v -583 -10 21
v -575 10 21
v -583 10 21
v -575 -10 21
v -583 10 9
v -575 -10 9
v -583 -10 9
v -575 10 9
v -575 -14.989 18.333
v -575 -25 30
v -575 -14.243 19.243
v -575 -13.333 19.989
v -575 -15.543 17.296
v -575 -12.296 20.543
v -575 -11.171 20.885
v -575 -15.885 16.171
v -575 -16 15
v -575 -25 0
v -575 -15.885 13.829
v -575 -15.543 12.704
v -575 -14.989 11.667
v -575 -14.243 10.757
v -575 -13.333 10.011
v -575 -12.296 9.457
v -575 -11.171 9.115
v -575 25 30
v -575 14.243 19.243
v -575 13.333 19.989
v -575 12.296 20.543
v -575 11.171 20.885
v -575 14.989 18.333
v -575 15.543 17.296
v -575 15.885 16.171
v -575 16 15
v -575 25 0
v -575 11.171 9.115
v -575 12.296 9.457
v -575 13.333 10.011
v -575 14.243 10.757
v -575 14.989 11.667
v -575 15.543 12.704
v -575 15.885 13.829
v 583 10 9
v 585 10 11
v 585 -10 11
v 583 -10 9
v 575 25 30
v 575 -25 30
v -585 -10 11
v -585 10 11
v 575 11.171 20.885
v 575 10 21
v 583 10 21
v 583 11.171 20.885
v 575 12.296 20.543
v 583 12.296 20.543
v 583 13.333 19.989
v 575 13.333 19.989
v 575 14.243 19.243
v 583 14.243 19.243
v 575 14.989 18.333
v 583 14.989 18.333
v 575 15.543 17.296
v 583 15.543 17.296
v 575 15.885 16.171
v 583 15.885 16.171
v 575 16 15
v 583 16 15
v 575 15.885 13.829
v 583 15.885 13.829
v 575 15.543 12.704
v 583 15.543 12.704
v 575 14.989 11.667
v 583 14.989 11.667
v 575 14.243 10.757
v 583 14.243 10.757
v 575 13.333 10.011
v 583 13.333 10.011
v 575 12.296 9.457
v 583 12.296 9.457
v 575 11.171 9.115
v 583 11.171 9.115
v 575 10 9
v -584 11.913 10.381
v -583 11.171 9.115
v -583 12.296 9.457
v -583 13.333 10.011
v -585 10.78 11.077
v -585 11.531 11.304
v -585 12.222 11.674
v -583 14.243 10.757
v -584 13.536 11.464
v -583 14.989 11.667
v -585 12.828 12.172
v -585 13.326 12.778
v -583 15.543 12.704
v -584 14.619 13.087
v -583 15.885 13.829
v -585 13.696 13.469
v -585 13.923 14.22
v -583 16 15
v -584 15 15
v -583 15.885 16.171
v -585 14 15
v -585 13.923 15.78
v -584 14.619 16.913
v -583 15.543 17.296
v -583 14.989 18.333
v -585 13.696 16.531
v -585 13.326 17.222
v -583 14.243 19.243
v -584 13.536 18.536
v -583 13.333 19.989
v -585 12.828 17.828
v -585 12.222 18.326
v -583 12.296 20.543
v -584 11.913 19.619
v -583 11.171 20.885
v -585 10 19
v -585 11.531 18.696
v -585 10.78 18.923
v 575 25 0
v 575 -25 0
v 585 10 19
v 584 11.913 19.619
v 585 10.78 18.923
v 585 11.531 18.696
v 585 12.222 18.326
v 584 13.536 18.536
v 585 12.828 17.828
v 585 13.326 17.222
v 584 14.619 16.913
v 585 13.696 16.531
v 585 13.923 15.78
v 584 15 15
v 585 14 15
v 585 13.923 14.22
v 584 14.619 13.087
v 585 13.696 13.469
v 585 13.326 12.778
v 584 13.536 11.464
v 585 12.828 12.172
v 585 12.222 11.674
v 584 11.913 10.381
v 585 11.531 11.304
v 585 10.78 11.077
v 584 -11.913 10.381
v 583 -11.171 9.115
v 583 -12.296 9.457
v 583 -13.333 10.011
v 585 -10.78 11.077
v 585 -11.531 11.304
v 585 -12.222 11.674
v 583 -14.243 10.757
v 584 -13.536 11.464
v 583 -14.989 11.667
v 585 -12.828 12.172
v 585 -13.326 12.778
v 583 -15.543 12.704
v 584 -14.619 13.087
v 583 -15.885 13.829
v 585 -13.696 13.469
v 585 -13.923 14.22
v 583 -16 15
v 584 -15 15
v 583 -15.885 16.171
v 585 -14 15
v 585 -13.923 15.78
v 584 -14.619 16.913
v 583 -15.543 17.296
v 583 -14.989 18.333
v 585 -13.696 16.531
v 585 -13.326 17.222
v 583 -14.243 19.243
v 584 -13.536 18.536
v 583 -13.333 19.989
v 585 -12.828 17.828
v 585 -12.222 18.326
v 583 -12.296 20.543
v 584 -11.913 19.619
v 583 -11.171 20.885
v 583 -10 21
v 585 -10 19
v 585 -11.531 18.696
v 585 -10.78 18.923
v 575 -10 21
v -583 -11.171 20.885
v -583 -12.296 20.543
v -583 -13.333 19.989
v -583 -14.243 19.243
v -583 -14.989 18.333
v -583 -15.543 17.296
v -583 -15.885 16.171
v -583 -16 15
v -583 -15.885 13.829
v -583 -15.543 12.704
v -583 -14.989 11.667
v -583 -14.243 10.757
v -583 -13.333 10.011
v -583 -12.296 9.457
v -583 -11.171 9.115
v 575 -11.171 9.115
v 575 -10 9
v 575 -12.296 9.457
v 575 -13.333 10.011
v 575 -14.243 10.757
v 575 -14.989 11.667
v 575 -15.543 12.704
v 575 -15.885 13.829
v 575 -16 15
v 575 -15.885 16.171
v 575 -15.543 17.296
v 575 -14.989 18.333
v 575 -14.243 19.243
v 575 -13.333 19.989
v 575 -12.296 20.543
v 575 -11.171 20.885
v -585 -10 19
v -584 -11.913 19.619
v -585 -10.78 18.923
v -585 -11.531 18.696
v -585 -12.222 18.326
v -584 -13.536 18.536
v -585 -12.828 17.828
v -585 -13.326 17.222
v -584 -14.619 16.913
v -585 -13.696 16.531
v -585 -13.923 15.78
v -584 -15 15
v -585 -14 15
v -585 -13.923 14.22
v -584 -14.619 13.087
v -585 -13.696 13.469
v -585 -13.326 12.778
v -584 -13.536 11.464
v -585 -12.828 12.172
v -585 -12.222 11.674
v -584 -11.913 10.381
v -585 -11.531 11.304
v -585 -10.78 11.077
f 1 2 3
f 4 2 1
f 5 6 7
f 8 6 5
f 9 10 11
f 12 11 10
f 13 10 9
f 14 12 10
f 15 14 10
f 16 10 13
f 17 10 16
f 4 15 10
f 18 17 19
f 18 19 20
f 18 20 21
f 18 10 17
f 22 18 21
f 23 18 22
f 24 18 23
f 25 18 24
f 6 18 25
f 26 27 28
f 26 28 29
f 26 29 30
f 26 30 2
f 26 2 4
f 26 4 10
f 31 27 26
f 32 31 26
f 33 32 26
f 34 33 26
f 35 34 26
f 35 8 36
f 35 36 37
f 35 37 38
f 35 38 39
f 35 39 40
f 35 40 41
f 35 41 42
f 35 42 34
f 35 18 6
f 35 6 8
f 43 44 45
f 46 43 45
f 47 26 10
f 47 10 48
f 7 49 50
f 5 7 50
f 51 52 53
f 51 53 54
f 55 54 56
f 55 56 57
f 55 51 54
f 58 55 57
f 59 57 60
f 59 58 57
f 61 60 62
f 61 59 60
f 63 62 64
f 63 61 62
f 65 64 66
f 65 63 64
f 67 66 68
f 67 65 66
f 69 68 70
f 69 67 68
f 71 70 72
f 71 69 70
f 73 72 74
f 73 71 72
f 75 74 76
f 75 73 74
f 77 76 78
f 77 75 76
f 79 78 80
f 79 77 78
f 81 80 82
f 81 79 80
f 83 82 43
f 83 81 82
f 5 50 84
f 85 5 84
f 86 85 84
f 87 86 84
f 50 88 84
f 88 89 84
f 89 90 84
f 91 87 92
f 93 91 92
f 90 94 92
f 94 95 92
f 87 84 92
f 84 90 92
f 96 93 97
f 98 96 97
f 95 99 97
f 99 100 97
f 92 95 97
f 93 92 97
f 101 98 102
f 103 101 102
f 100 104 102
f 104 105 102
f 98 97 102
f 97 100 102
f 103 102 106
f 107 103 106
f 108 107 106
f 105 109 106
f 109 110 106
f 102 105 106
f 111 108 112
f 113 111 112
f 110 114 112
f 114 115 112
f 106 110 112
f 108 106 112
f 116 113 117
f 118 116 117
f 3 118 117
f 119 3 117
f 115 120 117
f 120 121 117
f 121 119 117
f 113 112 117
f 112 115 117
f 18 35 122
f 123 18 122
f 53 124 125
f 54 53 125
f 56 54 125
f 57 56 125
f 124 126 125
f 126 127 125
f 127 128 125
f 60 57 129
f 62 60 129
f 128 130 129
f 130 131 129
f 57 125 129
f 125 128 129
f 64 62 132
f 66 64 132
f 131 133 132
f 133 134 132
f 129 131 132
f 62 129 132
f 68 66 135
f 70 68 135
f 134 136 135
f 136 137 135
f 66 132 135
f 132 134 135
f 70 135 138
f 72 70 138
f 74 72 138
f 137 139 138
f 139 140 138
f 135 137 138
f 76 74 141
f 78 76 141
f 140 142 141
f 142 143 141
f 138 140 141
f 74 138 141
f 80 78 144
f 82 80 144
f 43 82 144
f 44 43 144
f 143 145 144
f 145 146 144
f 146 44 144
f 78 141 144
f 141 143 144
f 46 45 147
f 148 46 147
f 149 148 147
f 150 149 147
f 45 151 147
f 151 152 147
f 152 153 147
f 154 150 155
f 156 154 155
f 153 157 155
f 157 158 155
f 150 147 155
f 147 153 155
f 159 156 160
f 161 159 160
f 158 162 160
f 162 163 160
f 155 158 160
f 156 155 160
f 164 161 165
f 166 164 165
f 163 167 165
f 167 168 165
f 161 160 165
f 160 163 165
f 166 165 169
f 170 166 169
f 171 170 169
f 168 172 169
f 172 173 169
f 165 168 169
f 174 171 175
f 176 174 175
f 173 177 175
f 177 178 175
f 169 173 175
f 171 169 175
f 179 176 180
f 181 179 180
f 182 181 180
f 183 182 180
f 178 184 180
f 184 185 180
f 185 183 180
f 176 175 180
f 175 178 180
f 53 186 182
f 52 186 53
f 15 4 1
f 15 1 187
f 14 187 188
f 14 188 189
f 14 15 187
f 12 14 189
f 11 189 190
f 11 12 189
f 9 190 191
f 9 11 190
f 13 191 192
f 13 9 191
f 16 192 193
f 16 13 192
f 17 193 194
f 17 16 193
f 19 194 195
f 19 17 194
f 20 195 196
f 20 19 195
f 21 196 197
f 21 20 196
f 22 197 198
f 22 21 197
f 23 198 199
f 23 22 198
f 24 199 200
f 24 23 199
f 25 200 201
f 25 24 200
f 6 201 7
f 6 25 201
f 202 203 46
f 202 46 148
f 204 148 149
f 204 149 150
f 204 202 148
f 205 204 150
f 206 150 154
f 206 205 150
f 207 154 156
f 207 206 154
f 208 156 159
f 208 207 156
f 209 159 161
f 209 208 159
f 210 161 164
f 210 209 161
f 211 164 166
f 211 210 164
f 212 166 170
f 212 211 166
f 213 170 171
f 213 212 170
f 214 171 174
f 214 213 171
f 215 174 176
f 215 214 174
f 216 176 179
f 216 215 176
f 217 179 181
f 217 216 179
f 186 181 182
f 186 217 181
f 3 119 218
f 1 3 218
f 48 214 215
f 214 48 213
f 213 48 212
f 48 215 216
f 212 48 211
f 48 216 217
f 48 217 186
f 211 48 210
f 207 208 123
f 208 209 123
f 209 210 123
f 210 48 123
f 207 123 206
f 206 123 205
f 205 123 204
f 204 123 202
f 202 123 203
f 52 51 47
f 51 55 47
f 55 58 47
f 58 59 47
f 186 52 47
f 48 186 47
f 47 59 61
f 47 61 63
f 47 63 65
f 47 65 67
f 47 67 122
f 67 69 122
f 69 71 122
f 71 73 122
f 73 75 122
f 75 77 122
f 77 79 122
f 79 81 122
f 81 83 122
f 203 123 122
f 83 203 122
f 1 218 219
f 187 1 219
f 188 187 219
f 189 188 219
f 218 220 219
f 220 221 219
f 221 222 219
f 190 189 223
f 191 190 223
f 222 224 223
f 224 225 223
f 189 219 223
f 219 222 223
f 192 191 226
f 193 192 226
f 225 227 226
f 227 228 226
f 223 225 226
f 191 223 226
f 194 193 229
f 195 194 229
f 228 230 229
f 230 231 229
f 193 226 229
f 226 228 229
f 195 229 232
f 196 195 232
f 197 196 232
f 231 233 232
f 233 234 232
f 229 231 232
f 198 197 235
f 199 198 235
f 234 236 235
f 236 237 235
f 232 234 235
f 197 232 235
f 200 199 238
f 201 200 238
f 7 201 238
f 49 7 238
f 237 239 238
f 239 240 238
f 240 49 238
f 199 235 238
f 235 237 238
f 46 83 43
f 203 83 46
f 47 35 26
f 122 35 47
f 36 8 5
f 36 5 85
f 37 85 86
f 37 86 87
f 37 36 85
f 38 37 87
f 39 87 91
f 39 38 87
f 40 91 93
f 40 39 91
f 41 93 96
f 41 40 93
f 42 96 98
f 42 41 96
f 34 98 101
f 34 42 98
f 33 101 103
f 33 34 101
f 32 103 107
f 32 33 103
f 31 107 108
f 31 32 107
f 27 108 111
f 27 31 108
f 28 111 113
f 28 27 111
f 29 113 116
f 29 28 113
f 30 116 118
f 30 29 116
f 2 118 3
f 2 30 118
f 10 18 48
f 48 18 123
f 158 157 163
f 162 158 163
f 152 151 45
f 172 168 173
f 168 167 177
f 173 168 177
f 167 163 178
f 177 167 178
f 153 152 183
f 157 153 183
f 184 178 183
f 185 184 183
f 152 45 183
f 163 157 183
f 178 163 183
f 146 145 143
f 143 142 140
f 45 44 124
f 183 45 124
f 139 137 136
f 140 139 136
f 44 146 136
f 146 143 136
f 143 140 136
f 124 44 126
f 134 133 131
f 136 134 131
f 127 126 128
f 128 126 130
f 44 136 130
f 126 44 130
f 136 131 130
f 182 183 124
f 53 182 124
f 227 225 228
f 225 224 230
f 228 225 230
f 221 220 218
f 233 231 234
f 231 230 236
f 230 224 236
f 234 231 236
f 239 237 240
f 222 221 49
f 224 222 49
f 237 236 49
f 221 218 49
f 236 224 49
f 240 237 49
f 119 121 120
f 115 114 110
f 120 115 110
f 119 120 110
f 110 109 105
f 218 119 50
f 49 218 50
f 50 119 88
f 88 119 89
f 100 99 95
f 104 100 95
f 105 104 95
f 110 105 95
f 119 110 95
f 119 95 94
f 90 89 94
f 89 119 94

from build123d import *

# Parameters (mm, degrees)
ESQUISSE1_W        = 1150
ESQUISSE1_H        = 50
BOSS_EXTRU_1_DEPTH = 30
BOSS_EXTRU_2_DEPTH = 10
CHANFREIN1_SIZE    = 2
BOSS_EXTRU_3_DEPTH = 10
CHANFREIN2_SIZE    = 2


with BuildPart() as part:
    # Esquisse1 → Boss.-Extru.1 (new body)
    with BuildSketch(Plane.XY):
        Rectangle(ESQUISSE1_W, ESQUISSE1_H)
    extrude(amount=BOSS_EXTRU_1_DEPTH)

    # Esquisse2 → Boss.-Extru.2 (add)
    with BuildSketch(Plane(origin=(575, 0, 0), x_dir=(0, 0, -1), z_dir=(1, 0, 0))):
        with BuildLine():
            Line((-9, 10), (-9, -10))
            ThreePointArc((-9, -10), (-15, -16), (-21, -10))
            Line((-21, -10), (-21, 10))
            ThreePointArc((-21, 10), (-15, 16), (-9, 10))
        make_face()
    extrude(amount=BOSS_EXTRU_2_DEPTH)

    # Chanfrein1
    chanfrein1_edges = [part.edges().sort_by_distance(p)[0] for p in [
        (585, 16, 15),
        (585, 0, 21),
        (585, -16, 15),
        (585, 0, 9),
    ]]
    chamfer(chanfrein1_edges, length=CHANFREIN1_SIZE)

    # Esquisse3 → Boss.-Extru.3 (add)
    with BuildSketch(Plane.ZY.offset(575)):
        with BuildLine():
            Line((21, 10), (21, -10))
            ThreePointArc((21, -10), (15, -16), (9, -10))
            Line((9, -10), (9, 10))
            ThreePointArc((9, 10), (15, 16), (21, 10))
        make_face()
    extrude(amount=BOSS_EXTRU_3_DEPTH)

    # Chanfrein2
    chanfrein2_edges = [part.edges().sort_by_distance(p)[0] for p in [
        (-585, 0, 21),
        (-585, 16, 15),
        (-585, 0, 9),
        (-585, -16, 15),
    ]]
    chamfer(chanfrein2_edges, length=CHANFREIN2_SIZE)


solid = part.part
